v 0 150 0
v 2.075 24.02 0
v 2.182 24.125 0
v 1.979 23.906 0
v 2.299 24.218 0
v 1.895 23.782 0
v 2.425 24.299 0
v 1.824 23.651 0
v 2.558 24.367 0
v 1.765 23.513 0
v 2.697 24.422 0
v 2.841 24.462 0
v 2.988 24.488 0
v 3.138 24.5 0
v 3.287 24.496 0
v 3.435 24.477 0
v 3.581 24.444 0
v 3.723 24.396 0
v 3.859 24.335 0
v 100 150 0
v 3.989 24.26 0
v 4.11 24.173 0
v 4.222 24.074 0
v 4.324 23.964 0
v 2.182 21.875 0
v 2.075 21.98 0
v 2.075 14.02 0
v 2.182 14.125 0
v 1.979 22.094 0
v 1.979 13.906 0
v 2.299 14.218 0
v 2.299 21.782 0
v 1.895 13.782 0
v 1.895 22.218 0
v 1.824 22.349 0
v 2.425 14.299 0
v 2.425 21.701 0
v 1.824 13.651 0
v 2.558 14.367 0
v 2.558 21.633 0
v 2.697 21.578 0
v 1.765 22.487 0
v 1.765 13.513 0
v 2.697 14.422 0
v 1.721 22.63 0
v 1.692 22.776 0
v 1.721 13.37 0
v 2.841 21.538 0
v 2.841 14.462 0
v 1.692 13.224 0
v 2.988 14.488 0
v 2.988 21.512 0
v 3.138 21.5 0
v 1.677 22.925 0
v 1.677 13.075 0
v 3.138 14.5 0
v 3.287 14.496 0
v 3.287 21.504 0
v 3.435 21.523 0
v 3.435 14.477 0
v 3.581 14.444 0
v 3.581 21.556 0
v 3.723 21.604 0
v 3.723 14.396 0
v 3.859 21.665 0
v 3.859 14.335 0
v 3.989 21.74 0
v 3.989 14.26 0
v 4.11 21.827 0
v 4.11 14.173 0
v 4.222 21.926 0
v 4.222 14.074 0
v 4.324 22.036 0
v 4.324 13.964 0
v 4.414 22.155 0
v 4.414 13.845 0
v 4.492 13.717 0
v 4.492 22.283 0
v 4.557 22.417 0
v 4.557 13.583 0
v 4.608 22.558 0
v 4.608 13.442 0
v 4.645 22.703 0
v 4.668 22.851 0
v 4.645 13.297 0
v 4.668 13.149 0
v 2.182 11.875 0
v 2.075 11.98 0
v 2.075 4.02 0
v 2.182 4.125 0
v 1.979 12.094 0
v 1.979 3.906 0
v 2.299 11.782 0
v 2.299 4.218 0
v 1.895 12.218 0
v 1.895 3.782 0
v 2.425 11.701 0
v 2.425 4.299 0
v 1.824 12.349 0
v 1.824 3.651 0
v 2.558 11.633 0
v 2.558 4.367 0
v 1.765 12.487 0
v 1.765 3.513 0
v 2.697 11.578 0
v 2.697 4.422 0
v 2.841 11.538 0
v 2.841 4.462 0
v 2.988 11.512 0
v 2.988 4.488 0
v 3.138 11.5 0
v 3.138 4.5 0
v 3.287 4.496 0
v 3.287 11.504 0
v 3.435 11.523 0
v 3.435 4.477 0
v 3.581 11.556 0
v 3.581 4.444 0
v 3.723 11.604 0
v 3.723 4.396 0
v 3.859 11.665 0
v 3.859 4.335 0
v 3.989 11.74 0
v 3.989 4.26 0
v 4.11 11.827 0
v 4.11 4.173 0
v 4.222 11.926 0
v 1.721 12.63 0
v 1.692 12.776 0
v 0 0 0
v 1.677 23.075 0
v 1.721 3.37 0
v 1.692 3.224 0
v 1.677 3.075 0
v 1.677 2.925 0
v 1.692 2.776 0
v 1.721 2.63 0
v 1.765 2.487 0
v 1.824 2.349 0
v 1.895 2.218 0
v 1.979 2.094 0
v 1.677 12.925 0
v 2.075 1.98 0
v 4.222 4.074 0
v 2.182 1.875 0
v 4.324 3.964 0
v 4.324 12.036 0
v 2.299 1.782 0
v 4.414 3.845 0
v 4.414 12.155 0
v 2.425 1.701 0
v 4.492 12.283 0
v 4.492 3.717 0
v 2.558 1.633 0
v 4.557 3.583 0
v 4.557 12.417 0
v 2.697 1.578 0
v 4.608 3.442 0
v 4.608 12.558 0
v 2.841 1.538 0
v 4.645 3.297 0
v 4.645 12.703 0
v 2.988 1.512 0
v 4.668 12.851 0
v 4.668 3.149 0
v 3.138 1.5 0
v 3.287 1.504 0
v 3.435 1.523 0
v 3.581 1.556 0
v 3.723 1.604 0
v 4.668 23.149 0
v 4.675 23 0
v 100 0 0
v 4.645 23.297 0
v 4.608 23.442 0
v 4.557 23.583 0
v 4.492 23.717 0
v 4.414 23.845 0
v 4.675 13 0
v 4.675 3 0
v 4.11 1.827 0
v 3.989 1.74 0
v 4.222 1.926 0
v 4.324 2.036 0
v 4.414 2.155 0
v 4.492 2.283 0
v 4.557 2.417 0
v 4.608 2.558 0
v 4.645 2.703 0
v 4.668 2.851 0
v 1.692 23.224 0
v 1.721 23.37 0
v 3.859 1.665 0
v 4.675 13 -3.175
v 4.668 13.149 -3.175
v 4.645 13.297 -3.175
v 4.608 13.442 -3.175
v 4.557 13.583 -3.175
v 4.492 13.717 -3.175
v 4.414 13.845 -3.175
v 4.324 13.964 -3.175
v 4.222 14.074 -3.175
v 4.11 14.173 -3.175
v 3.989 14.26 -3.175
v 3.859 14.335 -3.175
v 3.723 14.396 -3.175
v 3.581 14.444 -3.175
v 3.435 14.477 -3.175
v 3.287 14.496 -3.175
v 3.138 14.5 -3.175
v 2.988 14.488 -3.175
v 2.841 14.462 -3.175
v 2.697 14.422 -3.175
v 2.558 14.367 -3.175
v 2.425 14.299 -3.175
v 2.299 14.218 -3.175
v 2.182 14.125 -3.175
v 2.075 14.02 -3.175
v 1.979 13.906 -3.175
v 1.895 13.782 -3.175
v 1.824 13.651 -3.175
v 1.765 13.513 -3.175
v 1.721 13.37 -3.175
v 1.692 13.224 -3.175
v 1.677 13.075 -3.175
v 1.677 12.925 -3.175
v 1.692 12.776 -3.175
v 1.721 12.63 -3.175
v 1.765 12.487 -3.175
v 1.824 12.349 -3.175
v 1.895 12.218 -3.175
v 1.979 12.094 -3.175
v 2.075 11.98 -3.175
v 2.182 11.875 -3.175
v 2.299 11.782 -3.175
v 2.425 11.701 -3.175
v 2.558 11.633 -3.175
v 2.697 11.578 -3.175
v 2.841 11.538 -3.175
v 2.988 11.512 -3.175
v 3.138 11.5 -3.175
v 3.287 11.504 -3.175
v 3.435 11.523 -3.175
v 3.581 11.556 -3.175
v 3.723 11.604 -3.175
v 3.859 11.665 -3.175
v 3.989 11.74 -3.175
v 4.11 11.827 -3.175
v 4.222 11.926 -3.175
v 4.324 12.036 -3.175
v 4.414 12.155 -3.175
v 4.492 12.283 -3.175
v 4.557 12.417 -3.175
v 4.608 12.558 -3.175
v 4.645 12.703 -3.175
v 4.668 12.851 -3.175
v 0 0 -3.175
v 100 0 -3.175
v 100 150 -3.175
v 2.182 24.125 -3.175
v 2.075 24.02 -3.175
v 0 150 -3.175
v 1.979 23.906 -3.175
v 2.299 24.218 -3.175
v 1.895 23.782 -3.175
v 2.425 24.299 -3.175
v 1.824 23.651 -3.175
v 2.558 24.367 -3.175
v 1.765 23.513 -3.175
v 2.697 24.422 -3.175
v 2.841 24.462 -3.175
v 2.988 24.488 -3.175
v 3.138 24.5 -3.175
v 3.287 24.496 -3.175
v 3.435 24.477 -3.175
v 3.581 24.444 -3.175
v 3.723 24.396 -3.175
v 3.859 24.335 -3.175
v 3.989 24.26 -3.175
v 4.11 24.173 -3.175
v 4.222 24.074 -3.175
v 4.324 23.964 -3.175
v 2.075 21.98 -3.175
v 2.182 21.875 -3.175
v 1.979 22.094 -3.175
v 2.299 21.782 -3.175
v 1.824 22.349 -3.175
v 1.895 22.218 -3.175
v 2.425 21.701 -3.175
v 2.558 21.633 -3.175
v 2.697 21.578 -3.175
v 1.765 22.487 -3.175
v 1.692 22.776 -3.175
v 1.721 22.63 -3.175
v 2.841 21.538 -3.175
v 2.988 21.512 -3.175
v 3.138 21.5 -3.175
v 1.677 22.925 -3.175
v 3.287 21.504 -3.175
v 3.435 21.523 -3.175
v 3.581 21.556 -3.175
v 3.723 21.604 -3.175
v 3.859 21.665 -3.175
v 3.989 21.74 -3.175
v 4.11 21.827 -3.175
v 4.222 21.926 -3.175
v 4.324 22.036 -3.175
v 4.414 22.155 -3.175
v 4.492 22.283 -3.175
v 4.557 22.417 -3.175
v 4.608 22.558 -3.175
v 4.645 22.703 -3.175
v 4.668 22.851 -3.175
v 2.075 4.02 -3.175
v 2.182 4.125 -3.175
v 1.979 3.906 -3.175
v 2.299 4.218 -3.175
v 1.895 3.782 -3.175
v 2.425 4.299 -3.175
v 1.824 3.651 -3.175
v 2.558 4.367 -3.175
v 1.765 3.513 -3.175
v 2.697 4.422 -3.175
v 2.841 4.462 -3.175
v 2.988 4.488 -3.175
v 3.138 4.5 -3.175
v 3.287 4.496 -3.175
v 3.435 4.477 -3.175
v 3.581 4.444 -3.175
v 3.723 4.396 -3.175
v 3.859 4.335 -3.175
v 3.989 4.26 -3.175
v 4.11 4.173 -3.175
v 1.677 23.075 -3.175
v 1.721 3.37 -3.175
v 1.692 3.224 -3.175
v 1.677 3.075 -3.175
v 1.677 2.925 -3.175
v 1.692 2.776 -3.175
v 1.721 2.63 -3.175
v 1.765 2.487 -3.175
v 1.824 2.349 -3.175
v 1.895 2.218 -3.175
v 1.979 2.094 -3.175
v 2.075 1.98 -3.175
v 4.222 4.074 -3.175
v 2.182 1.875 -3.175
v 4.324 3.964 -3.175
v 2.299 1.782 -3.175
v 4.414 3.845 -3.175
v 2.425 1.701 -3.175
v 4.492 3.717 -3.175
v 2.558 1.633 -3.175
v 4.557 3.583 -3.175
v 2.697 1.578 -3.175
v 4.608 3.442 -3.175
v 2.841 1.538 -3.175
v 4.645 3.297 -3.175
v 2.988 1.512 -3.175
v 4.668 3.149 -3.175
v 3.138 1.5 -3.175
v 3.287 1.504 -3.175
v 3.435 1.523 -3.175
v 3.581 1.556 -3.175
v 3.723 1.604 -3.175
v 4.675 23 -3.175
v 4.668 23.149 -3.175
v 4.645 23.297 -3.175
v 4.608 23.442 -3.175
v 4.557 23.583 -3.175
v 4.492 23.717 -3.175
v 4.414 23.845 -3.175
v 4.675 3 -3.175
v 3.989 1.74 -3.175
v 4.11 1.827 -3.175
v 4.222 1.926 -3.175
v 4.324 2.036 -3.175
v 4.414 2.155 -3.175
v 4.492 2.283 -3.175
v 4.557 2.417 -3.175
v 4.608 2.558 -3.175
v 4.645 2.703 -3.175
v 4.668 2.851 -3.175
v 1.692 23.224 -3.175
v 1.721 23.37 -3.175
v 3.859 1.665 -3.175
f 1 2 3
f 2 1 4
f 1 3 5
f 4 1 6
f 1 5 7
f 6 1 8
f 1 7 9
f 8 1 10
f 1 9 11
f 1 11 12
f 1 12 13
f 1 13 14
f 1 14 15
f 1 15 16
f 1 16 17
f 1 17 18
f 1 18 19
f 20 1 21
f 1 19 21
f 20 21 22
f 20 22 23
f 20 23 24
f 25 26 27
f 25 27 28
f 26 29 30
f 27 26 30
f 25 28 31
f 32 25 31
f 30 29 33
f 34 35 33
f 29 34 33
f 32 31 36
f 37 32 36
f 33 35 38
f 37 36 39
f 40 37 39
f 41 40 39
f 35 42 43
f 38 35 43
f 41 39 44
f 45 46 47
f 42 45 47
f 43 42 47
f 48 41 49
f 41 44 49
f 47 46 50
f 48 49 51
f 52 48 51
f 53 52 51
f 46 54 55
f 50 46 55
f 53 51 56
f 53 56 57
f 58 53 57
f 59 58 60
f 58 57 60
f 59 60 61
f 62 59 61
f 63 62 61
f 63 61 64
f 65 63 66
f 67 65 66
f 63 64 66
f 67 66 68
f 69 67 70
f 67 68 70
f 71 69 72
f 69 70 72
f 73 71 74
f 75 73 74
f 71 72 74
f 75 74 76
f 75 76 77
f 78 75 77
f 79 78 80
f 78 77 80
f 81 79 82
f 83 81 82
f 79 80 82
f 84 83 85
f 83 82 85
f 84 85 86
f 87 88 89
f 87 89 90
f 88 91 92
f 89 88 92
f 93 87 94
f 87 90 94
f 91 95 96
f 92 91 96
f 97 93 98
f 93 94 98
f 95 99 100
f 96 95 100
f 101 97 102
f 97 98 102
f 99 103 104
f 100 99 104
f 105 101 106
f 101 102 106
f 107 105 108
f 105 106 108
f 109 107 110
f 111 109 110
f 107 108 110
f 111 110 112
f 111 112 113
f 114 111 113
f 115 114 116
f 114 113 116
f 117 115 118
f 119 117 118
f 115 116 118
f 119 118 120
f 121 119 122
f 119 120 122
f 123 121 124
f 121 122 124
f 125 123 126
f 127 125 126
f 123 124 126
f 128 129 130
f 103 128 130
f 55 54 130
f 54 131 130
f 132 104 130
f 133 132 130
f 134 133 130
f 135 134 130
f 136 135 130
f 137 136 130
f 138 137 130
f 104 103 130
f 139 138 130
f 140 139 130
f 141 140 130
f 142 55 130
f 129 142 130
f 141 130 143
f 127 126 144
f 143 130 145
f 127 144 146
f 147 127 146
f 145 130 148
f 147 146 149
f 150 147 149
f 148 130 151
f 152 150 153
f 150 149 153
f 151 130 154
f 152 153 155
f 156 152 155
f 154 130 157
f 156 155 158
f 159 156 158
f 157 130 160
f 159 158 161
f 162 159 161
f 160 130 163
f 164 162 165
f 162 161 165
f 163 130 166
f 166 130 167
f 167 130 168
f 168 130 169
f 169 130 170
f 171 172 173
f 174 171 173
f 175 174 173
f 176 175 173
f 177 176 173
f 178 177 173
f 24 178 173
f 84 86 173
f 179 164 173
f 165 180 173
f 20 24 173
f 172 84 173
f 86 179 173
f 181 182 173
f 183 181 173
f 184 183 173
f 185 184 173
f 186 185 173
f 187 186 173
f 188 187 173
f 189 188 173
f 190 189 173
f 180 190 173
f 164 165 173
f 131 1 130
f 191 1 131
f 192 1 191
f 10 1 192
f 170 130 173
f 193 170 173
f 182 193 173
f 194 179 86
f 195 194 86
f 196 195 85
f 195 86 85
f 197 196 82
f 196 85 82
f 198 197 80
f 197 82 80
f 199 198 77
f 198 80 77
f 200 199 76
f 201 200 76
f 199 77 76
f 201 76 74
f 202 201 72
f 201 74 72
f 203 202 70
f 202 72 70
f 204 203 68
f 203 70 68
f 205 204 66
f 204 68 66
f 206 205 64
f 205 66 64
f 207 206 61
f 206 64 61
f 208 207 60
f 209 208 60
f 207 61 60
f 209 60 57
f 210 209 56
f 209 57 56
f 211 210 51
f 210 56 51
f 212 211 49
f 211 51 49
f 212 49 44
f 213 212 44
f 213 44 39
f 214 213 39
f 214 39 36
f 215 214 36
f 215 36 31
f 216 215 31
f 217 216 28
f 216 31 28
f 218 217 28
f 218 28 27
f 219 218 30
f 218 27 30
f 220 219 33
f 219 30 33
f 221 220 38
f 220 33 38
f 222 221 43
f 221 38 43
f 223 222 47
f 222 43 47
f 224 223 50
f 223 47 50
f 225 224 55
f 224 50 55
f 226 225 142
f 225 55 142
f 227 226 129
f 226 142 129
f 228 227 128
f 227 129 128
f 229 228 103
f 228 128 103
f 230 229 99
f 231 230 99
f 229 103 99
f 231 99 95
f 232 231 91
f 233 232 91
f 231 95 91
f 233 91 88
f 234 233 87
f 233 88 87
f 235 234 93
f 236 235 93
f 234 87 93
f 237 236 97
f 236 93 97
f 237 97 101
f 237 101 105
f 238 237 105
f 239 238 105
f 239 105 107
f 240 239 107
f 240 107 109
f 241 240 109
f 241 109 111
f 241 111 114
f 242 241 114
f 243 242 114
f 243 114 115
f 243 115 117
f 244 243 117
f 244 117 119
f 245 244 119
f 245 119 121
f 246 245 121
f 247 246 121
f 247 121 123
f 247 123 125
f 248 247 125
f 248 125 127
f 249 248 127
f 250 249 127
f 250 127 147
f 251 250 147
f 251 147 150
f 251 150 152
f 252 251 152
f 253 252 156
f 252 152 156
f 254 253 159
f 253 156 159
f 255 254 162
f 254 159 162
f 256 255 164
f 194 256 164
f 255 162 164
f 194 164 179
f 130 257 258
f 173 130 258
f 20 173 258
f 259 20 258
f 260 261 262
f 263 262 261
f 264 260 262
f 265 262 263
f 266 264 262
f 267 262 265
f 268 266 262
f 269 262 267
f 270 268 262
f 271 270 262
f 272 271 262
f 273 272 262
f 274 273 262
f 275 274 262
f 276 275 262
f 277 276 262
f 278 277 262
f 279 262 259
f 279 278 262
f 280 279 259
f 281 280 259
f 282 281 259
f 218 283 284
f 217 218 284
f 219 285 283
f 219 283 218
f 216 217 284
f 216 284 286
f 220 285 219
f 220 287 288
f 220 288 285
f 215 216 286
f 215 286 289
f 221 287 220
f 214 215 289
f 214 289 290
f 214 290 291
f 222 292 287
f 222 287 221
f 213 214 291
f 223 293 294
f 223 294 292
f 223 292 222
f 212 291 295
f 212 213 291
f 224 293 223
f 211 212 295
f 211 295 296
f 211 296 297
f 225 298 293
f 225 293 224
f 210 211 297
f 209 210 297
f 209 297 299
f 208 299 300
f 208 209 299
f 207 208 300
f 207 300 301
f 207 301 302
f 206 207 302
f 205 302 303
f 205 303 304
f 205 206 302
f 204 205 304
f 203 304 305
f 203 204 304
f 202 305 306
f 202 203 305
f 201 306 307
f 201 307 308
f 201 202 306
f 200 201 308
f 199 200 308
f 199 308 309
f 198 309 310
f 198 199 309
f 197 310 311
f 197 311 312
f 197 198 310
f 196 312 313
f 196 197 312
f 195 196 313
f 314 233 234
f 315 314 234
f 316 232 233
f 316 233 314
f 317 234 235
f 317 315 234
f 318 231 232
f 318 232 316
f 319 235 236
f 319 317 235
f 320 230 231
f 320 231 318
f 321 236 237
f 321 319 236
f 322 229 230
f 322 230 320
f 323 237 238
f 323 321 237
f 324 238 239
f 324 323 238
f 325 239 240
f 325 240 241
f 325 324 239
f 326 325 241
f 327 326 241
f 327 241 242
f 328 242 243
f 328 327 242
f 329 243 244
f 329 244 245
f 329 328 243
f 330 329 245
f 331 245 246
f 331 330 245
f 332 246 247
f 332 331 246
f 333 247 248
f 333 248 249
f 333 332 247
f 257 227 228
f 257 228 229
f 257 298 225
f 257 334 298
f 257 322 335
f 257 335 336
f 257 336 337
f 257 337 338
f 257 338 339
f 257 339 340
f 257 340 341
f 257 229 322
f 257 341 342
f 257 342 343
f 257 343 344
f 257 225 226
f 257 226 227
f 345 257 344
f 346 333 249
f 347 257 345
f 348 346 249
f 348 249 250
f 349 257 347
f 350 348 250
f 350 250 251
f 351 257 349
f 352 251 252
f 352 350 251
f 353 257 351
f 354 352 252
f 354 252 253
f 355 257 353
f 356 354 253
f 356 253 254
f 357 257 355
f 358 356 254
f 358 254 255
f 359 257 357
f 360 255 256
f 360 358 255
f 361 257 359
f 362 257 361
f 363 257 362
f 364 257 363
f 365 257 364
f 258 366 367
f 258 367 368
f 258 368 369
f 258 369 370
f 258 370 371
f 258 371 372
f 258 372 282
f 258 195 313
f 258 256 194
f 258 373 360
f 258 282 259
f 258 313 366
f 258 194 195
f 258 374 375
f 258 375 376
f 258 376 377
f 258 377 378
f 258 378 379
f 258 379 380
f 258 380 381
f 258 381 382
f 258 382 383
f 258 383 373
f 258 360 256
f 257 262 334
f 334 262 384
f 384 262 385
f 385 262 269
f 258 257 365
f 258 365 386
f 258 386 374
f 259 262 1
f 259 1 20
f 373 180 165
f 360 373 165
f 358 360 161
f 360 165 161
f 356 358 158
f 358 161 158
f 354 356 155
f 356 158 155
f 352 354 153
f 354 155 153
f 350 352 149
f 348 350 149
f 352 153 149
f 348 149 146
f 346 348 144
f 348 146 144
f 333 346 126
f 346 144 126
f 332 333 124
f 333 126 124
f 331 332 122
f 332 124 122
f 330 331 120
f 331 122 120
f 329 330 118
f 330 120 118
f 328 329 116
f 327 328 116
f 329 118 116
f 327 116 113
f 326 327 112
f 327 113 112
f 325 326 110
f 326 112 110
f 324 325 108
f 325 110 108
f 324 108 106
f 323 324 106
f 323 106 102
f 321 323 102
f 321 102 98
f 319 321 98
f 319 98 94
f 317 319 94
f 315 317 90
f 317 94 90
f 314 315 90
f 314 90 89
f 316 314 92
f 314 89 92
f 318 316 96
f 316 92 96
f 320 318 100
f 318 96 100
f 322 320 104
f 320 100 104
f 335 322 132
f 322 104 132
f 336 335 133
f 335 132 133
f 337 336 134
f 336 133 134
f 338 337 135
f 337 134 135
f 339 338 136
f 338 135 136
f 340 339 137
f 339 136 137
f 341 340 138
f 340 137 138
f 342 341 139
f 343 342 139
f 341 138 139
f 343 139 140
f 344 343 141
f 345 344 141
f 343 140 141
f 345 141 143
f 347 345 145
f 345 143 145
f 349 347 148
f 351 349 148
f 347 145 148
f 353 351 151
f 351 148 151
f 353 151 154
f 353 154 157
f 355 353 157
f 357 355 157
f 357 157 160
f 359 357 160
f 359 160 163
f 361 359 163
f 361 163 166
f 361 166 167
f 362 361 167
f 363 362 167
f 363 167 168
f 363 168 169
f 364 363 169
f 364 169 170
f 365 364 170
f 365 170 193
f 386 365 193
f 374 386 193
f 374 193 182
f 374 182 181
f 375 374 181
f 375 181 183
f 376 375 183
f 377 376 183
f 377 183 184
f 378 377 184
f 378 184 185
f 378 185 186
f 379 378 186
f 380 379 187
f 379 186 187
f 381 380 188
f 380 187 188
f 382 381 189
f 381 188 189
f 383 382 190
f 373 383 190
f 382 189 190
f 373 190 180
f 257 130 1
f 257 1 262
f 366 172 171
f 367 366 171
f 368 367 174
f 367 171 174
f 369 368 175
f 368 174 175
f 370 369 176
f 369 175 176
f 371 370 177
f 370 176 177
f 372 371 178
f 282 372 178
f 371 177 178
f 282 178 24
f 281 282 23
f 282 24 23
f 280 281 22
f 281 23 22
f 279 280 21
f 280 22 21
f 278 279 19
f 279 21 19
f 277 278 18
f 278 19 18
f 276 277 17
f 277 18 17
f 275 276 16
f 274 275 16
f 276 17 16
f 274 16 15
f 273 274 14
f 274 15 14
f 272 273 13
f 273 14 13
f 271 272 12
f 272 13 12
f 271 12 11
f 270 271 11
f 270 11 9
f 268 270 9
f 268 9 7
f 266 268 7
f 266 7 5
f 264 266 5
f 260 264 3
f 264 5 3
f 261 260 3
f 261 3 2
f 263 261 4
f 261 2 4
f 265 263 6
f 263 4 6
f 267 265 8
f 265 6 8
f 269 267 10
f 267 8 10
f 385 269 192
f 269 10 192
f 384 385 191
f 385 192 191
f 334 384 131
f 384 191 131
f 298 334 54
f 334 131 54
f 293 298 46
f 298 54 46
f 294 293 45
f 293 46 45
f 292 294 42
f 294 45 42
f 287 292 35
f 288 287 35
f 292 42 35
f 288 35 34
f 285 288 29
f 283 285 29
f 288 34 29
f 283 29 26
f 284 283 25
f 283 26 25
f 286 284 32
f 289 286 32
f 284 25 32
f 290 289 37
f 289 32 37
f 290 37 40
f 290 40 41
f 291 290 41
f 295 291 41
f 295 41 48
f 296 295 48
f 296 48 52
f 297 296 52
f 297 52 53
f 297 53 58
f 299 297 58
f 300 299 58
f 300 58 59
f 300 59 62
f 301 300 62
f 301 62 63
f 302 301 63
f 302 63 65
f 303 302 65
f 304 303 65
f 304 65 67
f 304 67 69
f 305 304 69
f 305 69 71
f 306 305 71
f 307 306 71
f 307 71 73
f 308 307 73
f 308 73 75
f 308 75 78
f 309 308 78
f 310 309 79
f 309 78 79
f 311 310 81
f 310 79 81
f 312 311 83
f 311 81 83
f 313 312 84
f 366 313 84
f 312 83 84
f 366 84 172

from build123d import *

# Parameters (mm, degrees)
SKETCH1_W           = 100
SKETCH1_H           = 3.175
BOSS_EXTRUDE1_DEPTH = 150
SKETCH2_R           = 1.5
CUT_EXTRUDE2_DEPTH  = 3.175
SKETCH3_R           = 1.5
CUT_EXTRUDE3_DEPTH  = 3.175


with BuildPart() as part:
    # Sketch1 → Boss-Extrude1 (new body)
    with BuildSketch(Plane(origin=(0, 0, 0), x_dir=(1, 0, 0), z_dir=(0, 1, 0))):
        with Locations((50, 1.5875)):
            Rectangle(SKETCH1_W, SKETCH1_H)
    extrude(amount=BOSS_EXTRUDE1_DEPTH)

    # Sketch2 → Cut-Extrude2 (cut)
    with BuildSketch(Plane.XY):
        with Locations((3.175, 3)):
            Circle(SKETCH2_R)
        with Locations((3.175, 13)):
            Circle(SKETCH2_R)
    extrude(amount=-CUT_EXTRUDE2_DEPTH, mode=Mode.SUBTRACT)

    # Sketch3 → Cut-Extrude3 (cut)
    with BuildSketch(Plane.XY):
        with Locations((3.175, 23)):
            Circle(SKETCH3_R)
    extrude(amount=-CUT_EXTRUDE3_DEPTH, mode=Mode.SUBTRACT)


solid = part.part
